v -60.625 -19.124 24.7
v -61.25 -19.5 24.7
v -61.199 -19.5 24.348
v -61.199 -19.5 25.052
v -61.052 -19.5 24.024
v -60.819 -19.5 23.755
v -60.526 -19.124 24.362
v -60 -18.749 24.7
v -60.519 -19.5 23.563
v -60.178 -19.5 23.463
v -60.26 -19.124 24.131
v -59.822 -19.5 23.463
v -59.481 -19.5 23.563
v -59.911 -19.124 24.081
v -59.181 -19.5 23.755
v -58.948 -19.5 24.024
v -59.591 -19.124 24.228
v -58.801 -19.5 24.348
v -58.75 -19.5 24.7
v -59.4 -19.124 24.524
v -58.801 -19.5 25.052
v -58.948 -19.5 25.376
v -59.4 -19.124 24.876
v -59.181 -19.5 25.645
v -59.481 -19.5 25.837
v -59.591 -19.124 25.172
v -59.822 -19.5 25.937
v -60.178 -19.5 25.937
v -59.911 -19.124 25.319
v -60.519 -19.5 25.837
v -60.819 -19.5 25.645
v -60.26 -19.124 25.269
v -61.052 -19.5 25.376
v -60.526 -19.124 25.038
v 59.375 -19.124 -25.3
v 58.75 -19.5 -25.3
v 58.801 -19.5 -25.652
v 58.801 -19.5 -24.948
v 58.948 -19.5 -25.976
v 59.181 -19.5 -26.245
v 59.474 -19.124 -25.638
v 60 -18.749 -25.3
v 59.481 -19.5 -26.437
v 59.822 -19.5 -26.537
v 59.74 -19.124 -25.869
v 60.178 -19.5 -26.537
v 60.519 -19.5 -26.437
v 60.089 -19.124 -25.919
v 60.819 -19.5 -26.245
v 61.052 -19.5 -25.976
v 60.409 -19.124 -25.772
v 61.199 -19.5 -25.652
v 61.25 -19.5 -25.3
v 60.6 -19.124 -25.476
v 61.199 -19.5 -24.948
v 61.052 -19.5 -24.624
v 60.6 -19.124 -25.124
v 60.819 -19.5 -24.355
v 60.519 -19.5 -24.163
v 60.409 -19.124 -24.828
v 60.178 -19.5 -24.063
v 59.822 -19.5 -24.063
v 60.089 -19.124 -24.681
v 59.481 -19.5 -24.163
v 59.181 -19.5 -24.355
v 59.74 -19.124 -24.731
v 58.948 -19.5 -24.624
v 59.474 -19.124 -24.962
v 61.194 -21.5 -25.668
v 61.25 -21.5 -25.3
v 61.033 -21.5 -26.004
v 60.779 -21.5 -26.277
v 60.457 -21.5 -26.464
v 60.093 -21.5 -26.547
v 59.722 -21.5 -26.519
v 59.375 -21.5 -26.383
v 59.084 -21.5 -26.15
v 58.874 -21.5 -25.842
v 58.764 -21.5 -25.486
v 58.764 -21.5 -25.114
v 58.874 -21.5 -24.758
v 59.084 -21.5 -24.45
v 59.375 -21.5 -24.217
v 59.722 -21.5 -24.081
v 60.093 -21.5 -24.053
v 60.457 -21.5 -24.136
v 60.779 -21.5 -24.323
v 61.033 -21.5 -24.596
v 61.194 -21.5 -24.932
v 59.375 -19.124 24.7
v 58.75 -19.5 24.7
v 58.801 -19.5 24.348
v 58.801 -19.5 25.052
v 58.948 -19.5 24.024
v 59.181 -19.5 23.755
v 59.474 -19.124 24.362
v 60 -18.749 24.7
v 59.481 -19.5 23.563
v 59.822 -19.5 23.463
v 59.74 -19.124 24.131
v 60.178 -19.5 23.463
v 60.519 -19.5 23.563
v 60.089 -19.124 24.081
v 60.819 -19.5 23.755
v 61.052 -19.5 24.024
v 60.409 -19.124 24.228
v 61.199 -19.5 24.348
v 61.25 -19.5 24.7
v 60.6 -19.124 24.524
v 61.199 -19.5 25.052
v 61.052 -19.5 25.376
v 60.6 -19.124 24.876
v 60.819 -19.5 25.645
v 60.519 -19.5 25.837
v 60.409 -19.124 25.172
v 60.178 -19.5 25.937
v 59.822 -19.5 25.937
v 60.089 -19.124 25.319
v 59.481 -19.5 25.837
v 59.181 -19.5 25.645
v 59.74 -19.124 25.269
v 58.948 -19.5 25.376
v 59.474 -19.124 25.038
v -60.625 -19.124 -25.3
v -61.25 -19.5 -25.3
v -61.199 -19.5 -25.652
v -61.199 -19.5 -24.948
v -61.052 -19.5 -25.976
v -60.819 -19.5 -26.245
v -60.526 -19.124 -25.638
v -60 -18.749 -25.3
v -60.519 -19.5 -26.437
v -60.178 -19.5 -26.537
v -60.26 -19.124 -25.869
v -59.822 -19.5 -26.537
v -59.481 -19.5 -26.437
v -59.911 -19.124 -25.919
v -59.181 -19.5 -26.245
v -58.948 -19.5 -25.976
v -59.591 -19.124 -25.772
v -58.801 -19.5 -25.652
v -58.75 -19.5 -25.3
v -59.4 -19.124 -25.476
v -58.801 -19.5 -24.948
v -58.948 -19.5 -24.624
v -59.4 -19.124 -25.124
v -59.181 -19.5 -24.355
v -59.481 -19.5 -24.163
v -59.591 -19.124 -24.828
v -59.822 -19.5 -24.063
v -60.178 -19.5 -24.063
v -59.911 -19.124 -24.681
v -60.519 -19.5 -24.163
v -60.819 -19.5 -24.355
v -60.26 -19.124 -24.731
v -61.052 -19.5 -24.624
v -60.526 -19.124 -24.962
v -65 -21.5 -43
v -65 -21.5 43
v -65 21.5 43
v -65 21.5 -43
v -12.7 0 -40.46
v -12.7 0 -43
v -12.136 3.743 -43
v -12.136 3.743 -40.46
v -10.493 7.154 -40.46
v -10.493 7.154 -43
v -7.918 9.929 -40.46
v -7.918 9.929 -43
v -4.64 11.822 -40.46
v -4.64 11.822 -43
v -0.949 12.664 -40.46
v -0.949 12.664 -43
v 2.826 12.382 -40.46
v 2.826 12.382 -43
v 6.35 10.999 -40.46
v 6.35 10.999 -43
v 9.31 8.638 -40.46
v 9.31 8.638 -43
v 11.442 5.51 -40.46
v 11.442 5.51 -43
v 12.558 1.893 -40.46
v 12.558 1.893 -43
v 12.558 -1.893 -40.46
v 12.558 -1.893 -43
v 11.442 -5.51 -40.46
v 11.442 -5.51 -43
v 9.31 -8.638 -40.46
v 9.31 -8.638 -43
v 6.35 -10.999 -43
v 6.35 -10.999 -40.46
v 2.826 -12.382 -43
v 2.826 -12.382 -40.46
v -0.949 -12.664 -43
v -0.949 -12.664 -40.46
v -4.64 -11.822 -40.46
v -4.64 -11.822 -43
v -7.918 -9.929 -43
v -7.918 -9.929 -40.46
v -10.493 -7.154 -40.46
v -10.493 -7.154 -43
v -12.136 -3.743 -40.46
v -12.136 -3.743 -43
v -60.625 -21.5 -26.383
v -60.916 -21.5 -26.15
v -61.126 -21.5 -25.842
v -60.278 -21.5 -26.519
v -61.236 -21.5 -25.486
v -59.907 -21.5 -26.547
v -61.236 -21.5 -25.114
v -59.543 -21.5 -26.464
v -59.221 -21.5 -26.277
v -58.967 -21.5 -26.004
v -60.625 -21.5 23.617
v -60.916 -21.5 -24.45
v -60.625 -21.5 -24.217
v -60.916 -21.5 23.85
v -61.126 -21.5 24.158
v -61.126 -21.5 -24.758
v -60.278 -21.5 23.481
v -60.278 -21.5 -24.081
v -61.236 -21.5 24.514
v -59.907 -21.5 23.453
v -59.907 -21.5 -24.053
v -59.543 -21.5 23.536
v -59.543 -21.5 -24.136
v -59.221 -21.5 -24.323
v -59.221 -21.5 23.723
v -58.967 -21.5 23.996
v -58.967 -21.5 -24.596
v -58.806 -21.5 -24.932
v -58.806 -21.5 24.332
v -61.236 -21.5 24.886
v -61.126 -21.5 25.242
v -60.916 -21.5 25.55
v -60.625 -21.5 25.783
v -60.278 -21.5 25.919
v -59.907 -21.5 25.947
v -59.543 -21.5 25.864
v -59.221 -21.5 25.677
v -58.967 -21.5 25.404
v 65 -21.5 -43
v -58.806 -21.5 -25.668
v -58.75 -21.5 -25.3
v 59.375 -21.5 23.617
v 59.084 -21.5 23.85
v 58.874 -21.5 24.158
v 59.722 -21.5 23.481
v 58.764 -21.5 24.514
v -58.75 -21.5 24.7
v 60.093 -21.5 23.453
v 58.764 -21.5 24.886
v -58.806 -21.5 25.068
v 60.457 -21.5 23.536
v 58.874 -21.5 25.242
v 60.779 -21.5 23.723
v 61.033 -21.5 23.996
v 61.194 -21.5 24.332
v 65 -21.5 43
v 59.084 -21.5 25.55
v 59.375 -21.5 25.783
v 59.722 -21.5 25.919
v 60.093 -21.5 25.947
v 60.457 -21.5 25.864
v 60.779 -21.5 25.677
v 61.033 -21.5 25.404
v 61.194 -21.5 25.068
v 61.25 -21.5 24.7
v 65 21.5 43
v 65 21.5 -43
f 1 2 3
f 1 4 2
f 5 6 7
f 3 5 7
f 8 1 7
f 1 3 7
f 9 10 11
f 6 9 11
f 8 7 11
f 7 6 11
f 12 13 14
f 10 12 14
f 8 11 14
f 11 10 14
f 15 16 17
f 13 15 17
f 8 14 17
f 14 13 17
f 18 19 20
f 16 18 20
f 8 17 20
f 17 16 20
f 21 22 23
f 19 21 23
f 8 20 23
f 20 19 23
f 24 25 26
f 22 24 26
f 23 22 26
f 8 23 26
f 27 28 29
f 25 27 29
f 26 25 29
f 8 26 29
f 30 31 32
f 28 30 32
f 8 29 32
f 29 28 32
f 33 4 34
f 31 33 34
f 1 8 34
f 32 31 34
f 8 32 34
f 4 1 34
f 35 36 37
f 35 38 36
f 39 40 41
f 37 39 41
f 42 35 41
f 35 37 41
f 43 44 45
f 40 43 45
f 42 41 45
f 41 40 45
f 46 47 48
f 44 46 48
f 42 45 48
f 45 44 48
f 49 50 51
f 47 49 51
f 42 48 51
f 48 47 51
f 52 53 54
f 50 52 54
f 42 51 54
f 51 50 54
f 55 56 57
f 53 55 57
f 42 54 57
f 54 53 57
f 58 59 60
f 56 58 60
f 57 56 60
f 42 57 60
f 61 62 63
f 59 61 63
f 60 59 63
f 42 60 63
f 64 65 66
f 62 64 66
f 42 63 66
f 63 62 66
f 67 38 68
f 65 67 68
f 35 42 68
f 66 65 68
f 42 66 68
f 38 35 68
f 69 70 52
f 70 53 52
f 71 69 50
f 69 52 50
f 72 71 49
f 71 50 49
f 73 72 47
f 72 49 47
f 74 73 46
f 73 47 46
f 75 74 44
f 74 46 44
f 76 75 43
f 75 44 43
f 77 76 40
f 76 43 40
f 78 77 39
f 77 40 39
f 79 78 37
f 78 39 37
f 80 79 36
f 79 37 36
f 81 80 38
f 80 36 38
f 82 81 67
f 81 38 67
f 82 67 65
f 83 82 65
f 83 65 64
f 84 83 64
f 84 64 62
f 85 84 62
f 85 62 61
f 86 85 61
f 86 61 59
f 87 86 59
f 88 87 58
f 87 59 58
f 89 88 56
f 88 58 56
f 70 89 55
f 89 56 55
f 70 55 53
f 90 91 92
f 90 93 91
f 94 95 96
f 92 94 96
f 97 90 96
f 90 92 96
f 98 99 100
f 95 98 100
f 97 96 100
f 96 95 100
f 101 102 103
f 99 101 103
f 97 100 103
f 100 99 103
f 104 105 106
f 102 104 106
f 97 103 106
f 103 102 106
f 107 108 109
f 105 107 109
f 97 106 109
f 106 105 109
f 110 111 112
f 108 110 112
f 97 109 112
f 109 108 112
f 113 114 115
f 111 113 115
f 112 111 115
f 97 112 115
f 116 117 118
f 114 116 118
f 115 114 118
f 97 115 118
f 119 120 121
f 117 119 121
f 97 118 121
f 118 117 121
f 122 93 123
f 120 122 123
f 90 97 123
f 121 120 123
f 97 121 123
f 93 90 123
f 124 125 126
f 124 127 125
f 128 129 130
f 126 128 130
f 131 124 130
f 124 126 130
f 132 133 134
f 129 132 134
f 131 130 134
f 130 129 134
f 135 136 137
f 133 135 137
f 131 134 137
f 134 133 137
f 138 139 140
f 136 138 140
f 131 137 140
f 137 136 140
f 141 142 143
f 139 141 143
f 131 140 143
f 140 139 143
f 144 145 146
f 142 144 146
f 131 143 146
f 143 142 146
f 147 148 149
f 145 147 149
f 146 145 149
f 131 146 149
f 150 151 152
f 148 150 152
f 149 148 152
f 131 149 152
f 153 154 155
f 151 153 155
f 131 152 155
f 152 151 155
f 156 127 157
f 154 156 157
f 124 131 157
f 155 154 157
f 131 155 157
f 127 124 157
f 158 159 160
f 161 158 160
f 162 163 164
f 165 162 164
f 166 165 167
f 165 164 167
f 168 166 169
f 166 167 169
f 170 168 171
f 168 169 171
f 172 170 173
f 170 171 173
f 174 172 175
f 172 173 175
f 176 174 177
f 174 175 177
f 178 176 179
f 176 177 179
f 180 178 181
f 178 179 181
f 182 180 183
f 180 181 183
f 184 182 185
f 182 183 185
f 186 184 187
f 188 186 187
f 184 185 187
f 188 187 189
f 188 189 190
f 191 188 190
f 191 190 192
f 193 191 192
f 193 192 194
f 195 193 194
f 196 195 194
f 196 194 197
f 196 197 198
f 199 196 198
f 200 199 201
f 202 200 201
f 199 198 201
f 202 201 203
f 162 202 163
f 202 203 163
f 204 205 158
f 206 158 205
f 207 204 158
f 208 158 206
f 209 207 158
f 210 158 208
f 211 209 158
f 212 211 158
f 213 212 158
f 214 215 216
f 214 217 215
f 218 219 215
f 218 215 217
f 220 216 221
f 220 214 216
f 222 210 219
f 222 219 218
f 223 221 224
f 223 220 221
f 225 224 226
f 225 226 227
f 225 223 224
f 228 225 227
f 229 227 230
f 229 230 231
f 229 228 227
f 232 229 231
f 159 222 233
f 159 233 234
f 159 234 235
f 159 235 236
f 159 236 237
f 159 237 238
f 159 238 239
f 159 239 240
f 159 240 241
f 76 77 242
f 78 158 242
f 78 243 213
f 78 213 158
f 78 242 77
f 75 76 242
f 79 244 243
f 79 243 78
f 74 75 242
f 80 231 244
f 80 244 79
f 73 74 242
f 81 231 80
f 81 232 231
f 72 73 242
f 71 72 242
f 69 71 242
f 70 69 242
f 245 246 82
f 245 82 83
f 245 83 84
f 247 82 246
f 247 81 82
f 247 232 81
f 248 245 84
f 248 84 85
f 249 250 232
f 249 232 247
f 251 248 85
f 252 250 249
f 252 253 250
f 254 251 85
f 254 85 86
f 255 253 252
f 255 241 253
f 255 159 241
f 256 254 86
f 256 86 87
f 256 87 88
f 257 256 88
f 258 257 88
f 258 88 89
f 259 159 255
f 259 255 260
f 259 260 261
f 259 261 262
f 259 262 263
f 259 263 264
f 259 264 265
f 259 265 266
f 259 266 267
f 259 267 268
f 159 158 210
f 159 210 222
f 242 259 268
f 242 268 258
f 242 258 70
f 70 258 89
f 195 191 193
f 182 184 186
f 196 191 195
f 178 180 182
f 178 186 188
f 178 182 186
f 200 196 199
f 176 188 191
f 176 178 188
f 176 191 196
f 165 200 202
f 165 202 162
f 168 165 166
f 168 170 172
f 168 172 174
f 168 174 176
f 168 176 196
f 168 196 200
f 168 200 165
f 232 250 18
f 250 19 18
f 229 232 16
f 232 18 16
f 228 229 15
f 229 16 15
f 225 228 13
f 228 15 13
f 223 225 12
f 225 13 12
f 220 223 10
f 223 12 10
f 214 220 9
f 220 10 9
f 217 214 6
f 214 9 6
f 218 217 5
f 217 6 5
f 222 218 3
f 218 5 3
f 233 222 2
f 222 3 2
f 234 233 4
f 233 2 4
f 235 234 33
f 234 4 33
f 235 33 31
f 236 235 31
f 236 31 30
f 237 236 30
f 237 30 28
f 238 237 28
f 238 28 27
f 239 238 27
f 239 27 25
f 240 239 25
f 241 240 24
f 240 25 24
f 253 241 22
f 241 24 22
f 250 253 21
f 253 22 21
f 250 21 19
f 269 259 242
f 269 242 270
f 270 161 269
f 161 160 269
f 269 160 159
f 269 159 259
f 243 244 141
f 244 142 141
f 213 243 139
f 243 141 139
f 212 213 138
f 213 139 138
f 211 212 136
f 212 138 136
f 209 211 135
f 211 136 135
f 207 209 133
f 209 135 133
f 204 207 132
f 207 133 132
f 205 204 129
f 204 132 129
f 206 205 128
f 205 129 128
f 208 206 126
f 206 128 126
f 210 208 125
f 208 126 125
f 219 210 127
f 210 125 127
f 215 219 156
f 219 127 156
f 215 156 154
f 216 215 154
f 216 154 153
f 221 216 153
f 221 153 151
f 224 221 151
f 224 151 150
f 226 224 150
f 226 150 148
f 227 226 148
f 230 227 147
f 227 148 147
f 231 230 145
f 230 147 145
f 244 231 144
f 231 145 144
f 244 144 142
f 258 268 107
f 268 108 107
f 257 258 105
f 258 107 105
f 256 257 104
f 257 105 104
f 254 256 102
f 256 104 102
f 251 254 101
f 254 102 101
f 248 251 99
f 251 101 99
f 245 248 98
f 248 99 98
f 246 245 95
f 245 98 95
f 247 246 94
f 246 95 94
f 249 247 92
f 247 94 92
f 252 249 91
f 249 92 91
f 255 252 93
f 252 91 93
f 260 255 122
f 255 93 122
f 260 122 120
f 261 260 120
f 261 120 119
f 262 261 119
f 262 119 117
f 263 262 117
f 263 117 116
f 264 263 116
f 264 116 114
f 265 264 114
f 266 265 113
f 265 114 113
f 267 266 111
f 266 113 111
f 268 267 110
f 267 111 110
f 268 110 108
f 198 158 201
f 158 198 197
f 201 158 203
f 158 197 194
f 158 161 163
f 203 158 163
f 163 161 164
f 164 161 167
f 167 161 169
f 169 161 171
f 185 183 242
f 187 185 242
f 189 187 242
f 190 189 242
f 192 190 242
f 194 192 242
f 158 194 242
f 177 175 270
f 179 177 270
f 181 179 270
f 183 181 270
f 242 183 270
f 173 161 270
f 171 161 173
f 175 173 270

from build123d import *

# Parameters (mm, degrees)
SKETCH1_W                 = 130.000000096
SKETCH1_H                 = 43.000000106
BOSS_EXTRUDE1_DEPTH       = 42.999999979
M3X0_5_TAPPED_HOLE1_D     = 2.5
M3X0_5_TAPPED_HOLE1_DEPTH = 1.999996
M3X0_5_TAPPED_HOLE1_TIP   = 0.751075774
SKETCH4_R                 = 12.7
CUT_EXTRUDE1_DEPTH        = 2.54


with BuildPart() as part:
    # Sketch1 → Boss-Extrude1 (new, symmetric)
    with BuildSketch(Plane.XY):
        Rectangle(SKETCH1_W, SKETCH1_H)
    extrude(amount=BOSS_EXTRUDE1_DEPTH, both=True)

    # M3x0.5 Tapped Hole1
    with Locations(Plane(origin=(0, -21.500000053, 0), x_dir=(-1, 0, 0), z_dir=(0, -1, 0))):
        with Locations((60.000000142, -24.700000003), (-60.000000142, -24.700000003), (-60.000000142, 25.300000073), (60.000000142, 25.300000073)):
            Hole(M3X0_5_TAPPED_HOLE1_D / 2, depth=M3X0_5_TAPPED_HOLE1_DEPTH)
            with Locations((0, 0, -(M3X0_5_TAPPED_HOLE1_DEPTH + M3X0_5_TAPPED_HOLE1_TIP / 2))):  # 118° drill point
                Cone(0, M3X0_5_TAPPED_HOLE1_D / 2, M3X0_5_TAPPED_HOLE1_TIP, mode=Mode.SUBTRACT)

    # Sketch4 → Cut-Extrude1 (cut)
    with BuildSketch(Plane(origin=(0, 0, -42.999999979), x_dir=(-1, 0, 0), z_dir=(0, 0, -1))):
        Circle(SKETCH4_R)
    extrude(amount=-CUT_EXTRUDE1_DEPTH, mode=Mode.SUBTRACT)


solid = part.part
